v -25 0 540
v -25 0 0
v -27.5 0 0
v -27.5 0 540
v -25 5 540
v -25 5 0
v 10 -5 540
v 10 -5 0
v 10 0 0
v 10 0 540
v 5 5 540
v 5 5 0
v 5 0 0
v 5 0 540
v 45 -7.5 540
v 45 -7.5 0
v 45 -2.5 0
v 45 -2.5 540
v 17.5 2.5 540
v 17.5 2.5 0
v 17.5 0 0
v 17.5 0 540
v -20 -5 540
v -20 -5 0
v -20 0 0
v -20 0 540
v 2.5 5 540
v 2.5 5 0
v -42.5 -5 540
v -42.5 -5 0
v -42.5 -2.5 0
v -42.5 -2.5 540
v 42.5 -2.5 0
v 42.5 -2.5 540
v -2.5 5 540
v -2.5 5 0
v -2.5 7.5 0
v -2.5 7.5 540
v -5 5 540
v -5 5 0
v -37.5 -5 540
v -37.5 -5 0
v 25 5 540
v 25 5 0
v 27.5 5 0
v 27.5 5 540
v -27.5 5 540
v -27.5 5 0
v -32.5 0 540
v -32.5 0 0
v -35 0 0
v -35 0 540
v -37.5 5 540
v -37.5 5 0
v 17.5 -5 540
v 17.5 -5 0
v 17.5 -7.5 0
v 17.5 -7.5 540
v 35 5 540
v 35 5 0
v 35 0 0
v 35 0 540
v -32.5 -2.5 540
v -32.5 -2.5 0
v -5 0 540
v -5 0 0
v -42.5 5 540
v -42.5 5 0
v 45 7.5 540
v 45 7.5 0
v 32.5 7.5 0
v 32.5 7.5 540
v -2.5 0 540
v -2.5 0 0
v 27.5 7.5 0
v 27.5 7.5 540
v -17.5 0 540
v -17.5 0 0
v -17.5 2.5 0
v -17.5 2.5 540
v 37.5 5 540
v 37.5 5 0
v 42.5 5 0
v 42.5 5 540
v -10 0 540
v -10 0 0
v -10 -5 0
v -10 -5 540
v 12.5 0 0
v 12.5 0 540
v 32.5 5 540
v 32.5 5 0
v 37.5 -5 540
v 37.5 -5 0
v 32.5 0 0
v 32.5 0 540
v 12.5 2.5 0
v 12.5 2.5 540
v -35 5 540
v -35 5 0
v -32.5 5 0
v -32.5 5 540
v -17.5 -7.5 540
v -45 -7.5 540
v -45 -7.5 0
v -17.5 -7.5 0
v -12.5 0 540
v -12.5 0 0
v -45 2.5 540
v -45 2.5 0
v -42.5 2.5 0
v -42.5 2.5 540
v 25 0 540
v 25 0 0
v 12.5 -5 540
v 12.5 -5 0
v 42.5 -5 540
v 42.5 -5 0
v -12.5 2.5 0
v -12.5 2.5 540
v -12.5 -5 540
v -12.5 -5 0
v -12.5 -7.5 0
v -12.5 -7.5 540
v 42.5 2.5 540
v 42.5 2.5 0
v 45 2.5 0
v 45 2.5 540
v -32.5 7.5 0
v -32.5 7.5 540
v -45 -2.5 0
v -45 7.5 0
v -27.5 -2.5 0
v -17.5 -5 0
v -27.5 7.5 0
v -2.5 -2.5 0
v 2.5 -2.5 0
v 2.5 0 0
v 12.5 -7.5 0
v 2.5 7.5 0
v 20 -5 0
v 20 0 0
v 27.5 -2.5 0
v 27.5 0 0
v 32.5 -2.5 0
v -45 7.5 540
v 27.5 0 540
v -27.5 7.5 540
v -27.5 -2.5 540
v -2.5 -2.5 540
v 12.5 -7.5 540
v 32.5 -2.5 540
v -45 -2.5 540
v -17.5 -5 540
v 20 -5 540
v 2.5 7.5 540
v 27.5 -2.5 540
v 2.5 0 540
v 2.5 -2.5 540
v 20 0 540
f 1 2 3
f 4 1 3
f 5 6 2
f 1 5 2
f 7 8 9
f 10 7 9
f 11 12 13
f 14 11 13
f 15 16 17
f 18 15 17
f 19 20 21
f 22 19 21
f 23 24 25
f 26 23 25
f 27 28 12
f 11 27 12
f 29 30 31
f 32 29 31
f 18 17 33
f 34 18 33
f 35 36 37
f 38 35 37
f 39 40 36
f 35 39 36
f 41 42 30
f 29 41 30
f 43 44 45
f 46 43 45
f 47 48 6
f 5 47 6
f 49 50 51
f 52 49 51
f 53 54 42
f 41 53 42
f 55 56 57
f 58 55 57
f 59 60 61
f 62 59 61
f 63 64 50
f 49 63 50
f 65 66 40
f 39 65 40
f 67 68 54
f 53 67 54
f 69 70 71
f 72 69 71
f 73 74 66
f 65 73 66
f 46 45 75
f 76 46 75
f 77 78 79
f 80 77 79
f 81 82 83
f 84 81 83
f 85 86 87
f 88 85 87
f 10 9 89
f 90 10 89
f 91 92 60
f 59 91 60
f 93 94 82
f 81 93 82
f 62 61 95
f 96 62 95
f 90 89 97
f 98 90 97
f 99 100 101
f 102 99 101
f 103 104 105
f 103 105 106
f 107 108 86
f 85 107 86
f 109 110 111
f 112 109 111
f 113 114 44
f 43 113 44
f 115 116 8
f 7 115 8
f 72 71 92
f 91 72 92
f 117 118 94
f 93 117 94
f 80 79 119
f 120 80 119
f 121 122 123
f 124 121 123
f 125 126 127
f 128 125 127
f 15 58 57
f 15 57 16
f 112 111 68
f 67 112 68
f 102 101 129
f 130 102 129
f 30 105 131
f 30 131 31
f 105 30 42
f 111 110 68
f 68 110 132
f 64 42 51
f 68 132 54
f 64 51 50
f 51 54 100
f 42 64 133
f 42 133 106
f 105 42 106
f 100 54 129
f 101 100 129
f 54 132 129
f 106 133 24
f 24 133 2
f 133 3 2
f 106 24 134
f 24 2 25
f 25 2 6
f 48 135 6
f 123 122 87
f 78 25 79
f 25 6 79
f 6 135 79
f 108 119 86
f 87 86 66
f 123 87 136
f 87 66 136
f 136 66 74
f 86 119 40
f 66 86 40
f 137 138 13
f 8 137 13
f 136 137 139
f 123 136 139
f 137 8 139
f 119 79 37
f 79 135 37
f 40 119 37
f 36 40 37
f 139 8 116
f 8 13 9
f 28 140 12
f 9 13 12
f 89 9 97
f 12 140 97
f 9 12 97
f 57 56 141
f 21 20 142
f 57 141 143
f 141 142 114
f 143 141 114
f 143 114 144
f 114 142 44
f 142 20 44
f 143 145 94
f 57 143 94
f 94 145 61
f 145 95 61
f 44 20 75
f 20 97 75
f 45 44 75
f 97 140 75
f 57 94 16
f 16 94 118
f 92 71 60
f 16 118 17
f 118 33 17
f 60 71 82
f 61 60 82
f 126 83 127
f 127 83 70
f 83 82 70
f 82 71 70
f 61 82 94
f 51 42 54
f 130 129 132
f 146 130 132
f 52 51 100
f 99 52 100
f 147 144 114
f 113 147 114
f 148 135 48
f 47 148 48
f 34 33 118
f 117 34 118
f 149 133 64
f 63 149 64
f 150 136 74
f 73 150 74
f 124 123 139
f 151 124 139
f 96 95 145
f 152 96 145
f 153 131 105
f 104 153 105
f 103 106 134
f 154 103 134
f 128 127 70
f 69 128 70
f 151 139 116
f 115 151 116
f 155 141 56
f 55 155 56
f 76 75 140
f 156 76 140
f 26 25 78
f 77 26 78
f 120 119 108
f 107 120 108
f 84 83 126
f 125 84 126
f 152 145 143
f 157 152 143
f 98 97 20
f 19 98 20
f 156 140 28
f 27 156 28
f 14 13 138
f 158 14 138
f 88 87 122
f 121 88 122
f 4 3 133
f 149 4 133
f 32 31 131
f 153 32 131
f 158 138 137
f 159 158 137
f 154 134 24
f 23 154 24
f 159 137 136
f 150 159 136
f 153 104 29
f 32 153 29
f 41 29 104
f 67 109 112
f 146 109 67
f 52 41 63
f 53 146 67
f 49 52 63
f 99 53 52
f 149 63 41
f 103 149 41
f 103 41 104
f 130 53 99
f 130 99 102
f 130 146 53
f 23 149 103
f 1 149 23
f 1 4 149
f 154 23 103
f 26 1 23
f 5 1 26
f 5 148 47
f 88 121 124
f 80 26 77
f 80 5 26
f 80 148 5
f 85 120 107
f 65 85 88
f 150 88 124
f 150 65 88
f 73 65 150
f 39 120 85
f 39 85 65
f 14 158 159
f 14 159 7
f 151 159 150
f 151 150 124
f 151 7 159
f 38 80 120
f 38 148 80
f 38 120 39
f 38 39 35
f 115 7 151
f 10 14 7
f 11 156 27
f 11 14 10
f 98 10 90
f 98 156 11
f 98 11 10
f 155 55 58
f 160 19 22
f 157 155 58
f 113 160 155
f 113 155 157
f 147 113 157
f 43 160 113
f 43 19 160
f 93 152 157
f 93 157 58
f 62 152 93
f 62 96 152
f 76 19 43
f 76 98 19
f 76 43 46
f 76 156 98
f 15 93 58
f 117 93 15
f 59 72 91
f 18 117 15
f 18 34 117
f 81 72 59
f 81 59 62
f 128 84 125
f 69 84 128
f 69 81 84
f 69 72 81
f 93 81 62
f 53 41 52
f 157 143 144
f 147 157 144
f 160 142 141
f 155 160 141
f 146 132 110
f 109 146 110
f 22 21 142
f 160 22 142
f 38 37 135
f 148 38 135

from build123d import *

# Parameters (mm, degrees)
BOSS_EXTRUDE1_DEPTH = 540


with BuildPart() as part:
    # Sketch1 → Boss-Extrude1 (new body)
    with BuildSketch(Plane.XY):
        Polygon((-45, -7.5), (-17.5, -7.5), (-17.5, -5), (-20, -5), (-20, 0), (-17.5, 0), (-17.5, 2.5), (-12.5, 2.5), (-12.5, 0), (-10, 0), (-10, -5), (-12.5, -5), (-12.5, -7.5), (12.5, -7.5), (12.5, -5), (10, -5), (10, 0), (12.5, 0), (12.5, 2.5), (17.5, 2.5), (17.5, 0), (20, 0), (20, -5), (17.5, -5), (17.5, -7.5), (45, -7.5), (45, -2.5), (42.5, -2.5), (42.5, -5), (37.5, -5), (37.5, 5), (42.5, 5), (42.5, 2.5), (45, 2.5), (45, 7.5), (32.5, 7.5), (32.5, 5), (35, 5), (35, 0), (32.5, 0), (32.5, -2.5), (27.5, -2.5), (27.5, 0), (25, 0), (25, 5), (27.5, 5), (27.5, 7.5), (2.5, 7.5), (2.5, 5), (5, 5), (5, 0), (2.5, 0), (2.5, -2.5), (-2.5, -2.5), (-2.5, 0), (-5, 0), (-5, 5), (-2.5, 5), (-2.5, 7.5), (-27.5, 7.5), (-27.5, 5), (-25, 5), (-25, 0), (-27.5, 0), (-27.5, -2.5), (-32.5, -2.5), (-32.5, 0), (-35, 0), (-35, 5), (-32.5, 5), (-32.5, 7.5), (-45, 7.5), (-45, 2.5), (-42.5, 2.5), (-42.5, 5), (-37.5, 5), (-37.5, -5), (-42.5, -5), (-42.5, -2.5), (-45, -2.5), align=None)
    extrude(amount=BOSS_EXTRUDE1_DEPTH)


solid = part.part
